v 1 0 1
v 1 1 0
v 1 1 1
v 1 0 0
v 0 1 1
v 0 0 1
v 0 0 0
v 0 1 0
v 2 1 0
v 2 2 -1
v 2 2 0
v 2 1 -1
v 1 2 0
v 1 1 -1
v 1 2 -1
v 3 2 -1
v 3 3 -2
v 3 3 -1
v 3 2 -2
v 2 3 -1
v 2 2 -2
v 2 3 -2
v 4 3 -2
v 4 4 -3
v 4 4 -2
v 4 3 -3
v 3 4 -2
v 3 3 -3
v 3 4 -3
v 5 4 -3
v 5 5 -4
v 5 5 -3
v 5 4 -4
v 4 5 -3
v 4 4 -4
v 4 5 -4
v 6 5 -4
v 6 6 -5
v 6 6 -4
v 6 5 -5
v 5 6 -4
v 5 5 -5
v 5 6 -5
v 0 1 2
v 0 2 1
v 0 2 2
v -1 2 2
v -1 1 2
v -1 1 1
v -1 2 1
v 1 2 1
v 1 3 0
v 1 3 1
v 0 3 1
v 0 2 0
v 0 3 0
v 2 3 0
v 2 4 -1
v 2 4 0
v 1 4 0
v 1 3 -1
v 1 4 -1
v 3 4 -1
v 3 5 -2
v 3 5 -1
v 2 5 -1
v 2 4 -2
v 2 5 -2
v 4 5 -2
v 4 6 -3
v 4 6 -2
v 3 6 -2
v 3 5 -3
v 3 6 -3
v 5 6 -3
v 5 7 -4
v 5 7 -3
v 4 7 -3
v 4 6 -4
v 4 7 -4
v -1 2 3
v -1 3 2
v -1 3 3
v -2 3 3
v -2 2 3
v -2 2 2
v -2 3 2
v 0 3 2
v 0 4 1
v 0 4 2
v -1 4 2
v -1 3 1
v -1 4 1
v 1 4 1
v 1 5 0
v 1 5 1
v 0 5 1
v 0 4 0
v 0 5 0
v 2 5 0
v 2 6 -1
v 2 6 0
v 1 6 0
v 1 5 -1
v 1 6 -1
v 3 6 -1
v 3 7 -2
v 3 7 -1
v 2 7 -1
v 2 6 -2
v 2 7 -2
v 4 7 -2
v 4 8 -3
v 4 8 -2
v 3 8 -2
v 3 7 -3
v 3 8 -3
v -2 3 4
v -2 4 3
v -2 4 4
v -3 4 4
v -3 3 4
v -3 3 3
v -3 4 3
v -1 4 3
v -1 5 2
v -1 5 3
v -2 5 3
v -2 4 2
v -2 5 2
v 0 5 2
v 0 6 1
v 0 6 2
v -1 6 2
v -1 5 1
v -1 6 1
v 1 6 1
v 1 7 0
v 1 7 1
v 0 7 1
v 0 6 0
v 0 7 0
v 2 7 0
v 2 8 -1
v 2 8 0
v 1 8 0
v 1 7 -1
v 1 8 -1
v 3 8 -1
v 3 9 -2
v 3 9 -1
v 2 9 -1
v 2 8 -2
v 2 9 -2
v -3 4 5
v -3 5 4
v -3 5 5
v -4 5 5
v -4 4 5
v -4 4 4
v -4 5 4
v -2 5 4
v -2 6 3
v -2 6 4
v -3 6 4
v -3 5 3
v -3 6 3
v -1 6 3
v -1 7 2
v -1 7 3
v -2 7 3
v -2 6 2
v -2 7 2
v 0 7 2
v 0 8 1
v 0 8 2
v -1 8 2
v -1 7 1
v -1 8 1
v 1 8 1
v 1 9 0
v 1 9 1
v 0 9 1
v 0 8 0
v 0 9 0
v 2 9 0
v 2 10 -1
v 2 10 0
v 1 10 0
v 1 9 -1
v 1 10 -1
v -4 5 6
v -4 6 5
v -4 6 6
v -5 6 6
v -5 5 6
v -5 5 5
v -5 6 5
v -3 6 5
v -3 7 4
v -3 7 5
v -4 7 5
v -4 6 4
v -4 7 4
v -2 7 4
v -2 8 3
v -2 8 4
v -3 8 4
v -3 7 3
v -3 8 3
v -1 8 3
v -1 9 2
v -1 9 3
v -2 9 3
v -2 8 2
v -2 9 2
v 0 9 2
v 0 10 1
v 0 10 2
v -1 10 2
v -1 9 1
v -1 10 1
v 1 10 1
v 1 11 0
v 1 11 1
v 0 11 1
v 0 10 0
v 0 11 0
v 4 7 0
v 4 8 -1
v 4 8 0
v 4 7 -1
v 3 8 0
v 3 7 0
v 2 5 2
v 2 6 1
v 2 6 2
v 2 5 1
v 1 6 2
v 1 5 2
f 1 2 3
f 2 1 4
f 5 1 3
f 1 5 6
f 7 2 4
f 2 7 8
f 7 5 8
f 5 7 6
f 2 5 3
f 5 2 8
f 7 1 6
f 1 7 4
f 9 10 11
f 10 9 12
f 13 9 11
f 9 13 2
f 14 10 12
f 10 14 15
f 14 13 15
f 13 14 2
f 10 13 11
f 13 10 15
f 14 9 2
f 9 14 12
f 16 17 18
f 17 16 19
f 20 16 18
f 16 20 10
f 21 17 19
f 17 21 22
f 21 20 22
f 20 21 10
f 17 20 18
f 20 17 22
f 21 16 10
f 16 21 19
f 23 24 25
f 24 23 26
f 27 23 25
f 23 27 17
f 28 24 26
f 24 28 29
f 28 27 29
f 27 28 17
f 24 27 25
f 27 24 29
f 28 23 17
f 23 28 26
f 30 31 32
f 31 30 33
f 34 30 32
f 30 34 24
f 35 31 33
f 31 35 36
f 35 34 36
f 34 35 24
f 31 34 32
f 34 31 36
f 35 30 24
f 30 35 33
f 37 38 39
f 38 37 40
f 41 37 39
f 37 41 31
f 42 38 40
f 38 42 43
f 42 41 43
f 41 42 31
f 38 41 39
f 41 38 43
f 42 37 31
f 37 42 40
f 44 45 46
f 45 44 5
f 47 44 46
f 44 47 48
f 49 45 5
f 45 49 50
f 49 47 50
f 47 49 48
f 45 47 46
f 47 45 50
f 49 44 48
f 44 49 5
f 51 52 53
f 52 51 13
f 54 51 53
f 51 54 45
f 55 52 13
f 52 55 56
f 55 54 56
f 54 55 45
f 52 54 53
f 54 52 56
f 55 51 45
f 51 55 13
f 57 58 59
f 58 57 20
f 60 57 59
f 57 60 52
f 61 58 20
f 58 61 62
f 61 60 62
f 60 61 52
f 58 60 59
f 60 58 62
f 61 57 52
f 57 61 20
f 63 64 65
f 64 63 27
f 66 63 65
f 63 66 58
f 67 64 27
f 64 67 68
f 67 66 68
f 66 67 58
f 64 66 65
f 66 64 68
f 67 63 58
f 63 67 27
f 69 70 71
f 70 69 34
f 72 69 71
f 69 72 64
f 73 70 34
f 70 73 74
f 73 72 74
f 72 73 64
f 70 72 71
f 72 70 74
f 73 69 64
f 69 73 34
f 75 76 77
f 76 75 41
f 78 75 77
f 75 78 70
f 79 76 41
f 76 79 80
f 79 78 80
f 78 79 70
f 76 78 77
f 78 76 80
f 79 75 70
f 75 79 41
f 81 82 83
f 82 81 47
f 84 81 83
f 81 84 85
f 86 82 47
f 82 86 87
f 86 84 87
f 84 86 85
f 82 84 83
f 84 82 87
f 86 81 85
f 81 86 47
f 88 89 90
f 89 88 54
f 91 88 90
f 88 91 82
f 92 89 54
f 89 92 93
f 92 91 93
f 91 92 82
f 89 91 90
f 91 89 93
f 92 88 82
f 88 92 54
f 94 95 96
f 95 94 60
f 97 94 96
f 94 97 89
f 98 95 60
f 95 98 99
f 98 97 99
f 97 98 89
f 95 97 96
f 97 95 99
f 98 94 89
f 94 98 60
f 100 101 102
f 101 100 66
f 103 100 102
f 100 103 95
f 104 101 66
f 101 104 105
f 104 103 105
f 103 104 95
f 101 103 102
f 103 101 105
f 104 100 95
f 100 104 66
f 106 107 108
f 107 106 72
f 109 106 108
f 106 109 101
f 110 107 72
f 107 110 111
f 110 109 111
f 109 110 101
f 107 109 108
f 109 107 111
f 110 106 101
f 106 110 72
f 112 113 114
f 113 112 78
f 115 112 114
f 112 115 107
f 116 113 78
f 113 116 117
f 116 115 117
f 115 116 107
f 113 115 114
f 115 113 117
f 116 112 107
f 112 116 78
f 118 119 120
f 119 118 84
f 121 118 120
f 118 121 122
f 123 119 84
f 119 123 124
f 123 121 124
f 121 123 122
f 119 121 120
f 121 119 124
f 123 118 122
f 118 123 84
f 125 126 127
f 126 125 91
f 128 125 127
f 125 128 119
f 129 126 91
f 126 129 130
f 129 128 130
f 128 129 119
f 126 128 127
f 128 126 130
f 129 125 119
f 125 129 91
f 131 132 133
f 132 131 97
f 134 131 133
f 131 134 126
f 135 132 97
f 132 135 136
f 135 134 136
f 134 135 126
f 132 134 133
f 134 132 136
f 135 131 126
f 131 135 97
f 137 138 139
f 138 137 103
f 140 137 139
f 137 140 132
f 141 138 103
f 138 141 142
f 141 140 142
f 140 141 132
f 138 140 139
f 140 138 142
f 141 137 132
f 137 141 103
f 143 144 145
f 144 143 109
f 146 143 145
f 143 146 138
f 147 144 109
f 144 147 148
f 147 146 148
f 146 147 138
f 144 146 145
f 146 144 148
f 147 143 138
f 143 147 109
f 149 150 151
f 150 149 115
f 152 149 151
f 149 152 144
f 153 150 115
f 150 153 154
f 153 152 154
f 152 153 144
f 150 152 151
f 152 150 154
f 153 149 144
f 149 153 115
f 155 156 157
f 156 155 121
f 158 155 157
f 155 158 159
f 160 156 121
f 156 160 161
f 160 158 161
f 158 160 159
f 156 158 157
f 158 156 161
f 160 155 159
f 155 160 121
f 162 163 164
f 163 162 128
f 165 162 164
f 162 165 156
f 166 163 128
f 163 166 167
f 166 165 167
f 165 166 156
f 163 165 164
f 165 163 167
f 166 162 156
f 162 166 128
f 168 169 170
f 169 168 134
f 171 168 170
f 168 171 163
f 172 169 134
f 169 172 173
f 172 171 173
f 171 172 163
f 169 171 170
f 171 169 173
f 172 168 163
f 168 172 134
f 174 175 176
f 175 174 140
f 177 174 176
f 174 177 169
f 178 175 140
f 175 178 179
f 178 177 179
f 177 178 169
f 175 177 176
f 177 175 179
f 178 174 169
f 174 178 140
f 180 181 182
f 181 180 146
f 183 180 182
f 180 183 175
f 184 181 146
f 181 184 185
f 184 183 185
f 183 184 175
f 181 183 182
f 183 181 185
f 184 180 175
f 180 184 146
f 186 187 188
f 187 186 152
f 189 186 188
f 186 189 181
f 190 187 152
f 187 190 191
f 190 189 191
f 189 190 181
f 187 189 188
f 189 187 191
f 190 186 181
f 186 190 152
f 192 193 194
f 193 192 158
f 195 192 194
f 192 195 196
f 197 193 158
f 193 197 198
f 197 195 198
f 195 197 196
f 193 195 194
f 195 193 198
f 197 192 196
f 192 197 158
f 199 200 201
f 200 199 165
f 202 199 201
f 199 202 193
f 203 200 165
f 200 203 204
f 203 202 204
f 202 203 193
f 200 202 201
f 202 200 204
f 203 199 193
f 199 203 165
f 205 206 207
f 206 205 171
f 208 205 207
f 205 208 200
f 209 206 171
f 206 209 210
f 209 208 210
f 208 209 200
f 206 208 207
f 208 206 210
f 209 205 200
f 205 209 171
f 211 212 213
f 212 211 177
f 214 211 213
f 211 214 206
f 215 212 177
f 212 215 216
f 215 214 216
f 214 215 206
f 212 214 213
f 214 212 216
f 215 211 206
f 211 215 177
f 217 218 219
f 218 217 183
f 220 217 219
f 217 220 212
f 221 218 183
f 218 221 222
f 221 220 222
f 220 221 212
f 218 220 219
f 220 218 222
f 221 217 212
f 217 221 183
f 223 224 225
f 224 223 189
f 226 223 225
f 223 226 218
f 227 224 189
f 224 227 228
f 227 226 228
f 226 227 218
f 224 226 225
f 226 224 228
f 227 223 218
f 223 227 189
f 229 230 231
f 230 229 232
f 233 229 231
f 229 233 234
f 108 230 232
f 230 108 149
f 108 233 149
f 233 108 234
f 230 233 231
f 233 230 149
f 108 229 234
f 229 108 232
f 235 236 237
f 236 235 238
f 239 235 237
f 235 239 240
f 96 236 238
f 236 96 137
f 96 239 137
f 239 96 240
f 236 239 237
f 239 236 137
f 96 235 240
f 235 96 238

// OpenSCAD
for (x = [0 : 5], y = [0 : 5], z = [0 : 5])
{
    translate([y - x, y + x, x - y])
    cube(1);
}

translate([3, 7, -1])
color([0.8, 0.2, 0.2])
cube(1);

translate([1, 5, 1])
color([0.8, 0.2, 0.2])
cube(1);
